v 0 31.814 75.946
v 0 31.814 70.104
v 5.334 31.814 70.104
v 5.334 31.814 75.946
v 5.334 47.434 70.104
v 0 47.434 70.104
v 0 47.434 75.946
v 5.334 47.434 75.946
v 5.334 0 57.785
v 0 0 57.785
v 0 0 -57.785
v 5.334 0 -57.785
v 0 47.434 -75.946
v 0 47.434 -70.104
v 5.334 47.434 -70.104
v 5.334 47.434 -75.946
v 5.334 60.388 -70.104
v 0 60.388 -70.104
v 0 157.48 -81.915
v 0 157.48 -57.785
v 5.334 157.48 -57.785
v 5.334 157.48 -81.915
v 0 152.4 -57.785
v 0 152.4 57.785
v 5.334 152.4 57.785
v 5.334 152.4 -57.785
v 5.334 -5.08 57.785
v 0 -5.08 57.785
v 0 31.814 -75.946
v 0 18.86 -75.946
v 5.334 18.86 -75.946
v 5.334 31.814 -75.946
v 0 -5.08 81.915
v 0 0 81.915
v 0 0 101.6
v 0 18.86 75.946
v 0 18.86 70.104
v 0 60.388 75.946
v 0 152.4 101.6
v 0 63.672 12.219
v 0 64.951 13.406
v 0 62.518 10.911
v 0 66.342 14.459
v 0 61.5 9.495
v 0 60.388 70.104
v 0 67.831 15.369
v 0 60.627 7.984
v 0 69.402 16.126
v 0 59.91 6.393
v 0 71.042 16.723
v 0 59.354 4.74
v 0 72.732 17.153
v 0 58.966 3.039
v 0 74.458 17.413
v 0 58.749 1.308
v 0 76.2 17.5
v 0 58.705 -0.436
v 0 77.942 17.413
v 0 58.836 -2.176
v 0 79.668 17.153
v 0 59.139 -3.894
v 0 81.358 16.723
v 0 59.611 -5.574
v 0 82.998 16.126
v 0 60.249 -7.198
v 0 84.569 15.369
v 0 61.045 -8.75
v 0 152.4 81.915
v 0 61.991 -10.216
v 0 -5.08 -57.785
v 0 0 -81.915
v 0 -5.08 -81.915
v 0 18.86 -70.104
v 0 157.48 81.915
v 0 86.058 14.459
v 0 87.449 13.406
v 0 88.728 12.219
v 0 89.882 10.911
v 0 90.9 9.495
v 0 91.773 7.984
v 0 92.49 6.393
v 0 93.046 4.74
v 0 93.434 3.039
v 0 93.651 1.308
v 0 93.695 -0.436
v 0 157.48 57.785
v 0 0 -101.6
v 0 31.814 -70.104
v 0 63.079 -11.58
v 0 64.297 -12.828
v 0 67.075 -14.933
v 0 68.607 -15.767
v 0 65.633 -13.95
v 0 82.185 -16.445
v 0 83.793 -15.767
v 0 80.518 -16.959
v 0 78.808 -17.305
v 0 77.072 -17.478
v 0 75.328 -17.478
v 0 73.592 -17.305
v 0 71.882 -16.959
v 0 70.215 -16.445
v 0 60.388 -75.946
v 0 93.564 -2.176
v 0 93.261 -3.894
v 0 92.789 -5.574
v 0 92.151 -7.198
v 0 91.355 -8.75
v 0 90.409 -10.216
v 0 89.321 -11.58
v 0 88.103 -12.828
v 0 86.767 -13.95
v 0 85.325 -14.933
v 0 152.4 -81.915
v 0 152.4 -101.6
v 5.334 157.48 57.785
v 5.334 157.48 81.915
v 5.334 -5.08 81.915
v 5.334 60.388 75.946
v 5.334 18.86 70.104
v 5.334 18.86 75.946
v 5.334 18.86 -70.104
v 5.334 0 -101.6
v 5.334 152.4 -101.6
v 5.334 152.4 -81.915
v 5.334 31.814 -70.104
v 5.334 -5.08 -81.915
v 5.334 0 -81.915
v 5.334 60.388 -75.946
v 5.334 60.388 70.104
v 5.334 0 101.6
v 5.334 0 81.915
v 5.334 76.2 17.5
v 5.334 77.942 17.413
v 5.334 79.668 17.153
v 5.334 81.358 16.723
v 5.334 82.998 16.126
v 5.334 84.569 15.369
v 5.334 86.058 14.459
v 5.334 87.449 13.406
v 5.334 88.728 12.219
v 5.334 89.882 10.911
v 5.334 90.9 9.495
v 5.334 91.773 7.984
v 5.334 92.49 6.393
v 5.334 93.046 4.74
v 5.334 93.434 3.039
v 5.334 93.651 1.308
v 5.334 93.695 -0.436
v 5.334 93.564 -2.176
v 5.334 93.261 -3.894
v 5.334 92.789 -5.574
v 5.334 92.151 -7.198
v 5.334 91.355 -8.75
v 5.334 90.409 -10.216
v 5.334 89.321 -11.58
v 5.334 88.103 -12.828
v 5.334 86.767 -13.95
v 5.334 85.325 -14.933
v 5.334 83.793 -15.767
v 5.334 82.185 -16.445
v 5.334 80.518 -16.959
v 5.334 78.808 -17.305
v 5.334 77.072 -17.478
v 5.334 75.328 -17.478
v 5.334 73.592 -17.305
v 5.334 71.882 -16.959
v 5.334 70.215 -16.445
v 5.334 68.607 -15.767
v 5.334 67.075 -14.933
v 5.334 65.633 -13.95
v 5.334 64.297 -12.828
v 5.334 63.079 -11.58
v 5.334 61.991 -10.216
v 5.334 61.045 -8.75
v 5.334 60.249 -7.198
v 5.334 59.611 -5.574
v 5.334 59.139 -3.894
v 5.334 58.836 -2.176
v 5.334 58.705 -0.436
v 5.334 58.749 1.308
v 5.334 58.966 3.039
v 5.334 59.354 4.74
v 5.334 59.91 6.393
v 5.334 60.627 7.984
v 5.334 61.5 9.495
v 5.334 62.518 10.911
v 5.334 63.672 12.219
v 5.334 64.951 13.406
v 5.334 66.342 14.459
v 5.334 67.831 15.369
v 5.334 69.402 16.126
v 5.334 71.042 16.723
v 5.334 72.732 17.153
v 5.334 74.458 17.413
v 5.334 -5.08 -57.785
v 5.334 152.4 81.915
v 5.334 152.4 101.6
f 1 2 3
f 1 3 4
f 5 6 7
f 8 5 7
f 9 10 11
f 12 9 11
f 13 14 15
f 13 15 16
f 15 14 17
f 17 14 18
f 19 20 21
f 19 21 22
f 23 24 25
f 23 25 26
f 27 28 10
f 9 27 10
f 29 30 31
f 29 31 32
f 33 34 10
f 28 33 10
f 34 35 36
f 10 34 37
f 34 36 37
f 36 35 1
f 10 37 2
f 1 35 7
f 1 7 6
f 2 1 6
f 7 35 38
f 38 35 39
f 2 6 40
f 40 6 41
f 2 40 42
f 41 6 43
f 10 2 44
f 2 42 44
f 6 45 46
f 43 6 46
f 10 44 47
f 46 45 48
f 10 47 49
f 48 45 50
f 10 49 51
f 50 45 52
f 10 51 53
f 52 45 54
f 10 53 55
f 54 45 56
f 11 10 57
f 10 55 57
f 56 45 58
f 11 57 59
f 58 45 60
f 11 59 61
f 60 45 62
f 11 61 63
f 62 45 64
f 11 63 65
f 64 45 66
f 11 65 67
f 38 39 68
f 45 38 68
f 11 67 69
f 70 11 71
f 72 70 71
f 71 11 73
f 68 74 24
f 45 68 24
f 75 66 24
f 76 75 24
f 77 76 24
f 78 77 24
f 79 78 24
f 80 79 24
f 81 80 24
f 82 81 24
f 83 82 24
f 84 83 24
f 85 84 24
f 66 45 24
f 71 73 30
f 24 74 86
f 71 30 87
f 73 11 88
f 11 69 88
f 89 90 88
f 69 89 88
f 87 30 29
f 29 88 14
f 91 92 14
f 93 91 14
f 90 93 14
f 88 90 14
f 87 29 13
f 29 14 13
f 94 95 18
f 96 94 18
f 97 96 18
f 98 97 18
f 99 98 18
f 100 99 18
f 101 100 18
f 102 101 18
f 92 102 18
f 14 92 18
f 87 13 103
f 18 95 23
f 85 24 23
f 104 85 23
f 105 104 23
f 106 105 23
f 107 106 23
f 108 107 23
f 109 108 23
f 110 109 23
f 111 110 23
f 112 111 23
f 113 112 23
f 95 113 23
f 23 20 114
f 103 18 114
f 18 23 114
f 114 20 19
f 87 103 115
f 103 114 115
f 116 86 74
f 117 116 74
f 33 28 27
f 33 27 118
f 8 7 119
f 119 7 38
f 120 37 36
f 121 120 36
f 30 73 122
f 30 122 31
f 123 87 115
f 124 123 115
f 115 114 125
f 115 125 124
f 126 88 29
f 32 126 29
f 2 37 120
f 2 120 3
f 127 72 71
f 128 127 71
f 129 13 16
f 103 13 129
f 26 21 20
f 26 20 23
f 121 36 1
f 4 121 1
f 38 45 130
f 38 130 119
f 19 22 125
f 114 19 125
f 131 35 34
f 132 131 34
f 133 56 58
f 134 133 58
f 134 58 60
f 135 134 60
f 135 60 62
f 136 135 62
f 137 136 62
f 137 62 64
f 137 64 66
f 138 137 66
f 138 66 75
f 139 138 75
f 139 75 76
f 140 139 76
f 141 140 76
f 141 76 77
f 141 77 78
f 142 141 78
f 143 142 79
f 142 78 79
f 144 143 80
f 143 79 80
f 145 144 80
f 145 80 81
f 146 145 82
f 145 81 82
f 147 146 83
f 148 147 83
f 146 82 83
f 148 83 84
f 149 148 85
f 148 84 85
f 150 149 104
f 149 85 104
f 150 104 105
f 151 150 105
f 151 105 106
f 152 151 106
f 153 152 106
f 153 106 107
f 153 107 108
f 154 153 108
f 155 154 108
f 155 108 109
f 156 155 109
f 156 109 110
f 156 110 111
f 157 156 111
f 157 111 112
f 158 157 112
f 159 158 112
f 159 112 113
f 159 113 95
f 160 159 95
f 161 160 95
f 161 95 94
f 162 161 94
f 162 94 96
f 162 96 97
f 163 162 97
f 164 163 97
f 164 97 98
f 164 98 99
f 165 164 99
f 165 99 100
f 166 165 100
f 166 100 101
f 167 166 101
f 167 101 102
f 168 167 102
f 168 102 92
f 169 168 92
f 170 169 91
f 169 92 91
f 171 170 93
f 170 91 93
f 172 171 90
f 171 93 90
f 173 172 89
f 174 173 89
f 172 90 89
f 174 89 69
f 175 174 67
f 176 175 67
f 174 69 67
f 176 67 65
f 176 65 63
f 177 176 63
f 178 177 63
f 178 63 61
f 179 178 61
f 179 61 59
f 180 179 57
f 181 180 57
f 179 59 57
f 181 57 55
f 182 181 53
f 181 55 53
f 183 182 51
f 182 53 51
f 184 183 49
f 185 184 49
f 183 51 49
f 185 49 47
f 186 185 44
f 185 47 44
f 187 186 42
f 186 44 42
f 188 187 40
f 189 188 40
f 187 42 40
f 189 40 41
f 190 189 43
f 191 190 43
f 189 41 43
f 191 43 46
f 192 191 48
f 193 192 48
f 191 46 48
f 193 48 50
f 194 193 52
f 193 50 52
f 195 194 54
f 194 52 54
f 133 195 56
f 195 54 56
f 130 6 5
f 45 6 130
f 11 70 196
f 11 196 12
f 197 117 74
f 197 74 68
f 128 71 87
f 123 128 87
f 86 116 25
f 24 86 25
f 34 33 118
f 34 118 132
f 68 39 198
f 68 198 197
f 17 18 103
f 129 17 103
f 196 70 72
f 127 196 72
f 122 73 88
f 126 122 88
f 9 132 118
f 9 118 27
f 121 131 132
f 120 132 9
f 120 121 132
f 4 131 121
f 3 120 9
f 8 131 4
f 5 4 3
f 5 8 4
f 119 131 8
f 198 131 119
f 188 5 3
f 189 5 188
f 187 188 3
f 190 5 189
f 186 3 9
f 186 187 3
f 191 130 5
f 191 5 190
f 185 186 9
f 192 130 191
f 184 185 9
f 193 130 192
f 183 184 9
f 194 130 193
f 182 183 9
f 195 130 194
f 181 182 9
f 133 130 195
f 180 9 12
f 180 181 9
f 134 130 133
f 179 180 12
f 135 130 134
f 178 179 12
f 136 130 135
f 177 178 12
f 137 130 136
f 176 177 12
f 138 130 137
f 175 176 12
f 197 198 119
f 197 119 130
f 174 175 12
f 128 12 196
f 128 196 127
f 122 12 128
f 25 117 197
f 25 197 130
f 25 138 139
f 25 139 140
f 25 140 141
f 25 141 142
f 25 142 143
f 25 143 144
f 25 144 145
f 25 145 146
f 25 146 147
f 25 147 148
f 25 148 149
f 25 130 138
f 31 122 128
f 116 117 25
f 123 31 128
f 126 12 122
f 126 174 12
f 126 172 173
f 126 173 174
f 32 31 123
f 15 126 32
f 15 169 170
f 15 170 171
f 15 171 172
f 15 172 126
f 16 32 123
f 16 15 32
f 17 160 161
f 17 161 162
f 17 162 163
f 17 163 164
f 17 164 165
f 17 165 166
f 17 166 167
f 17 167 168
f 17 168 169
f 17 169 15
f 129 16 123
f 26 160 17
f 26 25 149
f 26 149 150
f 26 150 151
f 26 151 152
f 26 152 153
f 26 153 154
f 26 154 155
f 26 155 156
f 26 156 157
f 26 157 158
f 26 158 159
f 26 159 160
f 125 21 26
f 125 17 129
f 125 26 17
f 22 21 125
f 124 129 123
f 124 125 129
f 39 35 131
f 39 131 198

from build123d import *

# Parameters (mm, degrees)
SKETCH1_W               = 203.2
SKETCH1_H               = 152.4
BOSS_EXTRUDE2_DEPTH     = 5.334
SKETCH2_R               = 17.5
CUT_EXTRUDE1_DEPTH      = 184.239656068
SKETCH3_W               = 24.13
SKETCH3_H               = 5.08
BOSS_EXTRUDE3_DEPTH     = 5.334
SKETCH4_W               = 5.842
SKETCH4_H               = 12.954
CUT_EXTRUDE2_DEPTH      = 184.239656068
MIRROR3_COPY_1_SKETCH_W = 24.13
MIRROR3_COPY_1_SKETCH_H = 5.08
MIRROR3_COPY_1_DEPTH    = 5.334


with BuildPart() as part:
    # Sketch1 → Boss-Extrude2 (new body)
    with BuildSketch(Plane(origin=(0, 0, 0), x_dir=(0, 0, -1), z_dir=(1, 0, 0))):
        with Locations((0, 76.2)):
            Rectangle(SKETCH1_W, SKETCH1_H)
    extrude(amount=BOSS_EXTRUDE2_DEPTH)

    # Sketch2 → Cut-Extrude1 (cut, through all)
    with BuildSketch(Plane.ZY):
        with Locations((0, 76.2)):
            Circle(SKETCH2_R)
    extrude(amount=-CUT_EXTRUDE1_DEPTH, mode=Mode.SUBTRACT)

    # Sketch3 → Boss-Extrude3 (add, through all)
    with BuildSketch(Plane.ZY):
        with Locations((69.85, -2.54)):
            Rectangle(SKETCH3_W, SKETCH3_H)
    boss_extrude3 = extrude(amount=-BOSS_EXTRUDE3_DEPTH)

    # Mirror1: Boss-Extrude3 across plane
    add(boss_extrude3.mirror(Plane.XY))

    # Sketch4 → Cut-Extrude2 (cut, through all)
    with BuildSketch(Plane.ZY):
        with Locations((73.025, 53.9115)):
            Rectangle(SKETCH4_W, SKETCH4_H)
        with Locations((73.025, 25.3365)):
            Rectangle(SKETCH4_W, SKETCH4_H)
    cut_extrude2 = extrude(amount=-CUT_EXTRUDE2_DEPTH, mode=Mode.SUBTRACT)

    # Mirror2: Cut-Extrude2 across plane
    add(cut_extrude2.mirror(Plane.XY), mode=Mode.SUBTRACT)

    # Mirror3: Boss-Extrude3 across plane
    add(boss_extrude3.mirror(Plane.ZX.offset(76.2)))

    # Mirror3 copy 1 sketch → Mirror3 copy 1 (add, through all)
    with BuildSketch(Plane(origin=(0, 152.4, 0), x_dir=(0, 0, -1), z_dir=(-1, 0, 0))):
        with Locations((69.85, -2.54)):
            Rectangle(MIRROR3_COPY_1_SKETCH_W, MIRROR3_COPY_1_SKETCH_H)
    extrude(amount=-MIRROR3_COPY_1_DEPTH)


solid = part.part
